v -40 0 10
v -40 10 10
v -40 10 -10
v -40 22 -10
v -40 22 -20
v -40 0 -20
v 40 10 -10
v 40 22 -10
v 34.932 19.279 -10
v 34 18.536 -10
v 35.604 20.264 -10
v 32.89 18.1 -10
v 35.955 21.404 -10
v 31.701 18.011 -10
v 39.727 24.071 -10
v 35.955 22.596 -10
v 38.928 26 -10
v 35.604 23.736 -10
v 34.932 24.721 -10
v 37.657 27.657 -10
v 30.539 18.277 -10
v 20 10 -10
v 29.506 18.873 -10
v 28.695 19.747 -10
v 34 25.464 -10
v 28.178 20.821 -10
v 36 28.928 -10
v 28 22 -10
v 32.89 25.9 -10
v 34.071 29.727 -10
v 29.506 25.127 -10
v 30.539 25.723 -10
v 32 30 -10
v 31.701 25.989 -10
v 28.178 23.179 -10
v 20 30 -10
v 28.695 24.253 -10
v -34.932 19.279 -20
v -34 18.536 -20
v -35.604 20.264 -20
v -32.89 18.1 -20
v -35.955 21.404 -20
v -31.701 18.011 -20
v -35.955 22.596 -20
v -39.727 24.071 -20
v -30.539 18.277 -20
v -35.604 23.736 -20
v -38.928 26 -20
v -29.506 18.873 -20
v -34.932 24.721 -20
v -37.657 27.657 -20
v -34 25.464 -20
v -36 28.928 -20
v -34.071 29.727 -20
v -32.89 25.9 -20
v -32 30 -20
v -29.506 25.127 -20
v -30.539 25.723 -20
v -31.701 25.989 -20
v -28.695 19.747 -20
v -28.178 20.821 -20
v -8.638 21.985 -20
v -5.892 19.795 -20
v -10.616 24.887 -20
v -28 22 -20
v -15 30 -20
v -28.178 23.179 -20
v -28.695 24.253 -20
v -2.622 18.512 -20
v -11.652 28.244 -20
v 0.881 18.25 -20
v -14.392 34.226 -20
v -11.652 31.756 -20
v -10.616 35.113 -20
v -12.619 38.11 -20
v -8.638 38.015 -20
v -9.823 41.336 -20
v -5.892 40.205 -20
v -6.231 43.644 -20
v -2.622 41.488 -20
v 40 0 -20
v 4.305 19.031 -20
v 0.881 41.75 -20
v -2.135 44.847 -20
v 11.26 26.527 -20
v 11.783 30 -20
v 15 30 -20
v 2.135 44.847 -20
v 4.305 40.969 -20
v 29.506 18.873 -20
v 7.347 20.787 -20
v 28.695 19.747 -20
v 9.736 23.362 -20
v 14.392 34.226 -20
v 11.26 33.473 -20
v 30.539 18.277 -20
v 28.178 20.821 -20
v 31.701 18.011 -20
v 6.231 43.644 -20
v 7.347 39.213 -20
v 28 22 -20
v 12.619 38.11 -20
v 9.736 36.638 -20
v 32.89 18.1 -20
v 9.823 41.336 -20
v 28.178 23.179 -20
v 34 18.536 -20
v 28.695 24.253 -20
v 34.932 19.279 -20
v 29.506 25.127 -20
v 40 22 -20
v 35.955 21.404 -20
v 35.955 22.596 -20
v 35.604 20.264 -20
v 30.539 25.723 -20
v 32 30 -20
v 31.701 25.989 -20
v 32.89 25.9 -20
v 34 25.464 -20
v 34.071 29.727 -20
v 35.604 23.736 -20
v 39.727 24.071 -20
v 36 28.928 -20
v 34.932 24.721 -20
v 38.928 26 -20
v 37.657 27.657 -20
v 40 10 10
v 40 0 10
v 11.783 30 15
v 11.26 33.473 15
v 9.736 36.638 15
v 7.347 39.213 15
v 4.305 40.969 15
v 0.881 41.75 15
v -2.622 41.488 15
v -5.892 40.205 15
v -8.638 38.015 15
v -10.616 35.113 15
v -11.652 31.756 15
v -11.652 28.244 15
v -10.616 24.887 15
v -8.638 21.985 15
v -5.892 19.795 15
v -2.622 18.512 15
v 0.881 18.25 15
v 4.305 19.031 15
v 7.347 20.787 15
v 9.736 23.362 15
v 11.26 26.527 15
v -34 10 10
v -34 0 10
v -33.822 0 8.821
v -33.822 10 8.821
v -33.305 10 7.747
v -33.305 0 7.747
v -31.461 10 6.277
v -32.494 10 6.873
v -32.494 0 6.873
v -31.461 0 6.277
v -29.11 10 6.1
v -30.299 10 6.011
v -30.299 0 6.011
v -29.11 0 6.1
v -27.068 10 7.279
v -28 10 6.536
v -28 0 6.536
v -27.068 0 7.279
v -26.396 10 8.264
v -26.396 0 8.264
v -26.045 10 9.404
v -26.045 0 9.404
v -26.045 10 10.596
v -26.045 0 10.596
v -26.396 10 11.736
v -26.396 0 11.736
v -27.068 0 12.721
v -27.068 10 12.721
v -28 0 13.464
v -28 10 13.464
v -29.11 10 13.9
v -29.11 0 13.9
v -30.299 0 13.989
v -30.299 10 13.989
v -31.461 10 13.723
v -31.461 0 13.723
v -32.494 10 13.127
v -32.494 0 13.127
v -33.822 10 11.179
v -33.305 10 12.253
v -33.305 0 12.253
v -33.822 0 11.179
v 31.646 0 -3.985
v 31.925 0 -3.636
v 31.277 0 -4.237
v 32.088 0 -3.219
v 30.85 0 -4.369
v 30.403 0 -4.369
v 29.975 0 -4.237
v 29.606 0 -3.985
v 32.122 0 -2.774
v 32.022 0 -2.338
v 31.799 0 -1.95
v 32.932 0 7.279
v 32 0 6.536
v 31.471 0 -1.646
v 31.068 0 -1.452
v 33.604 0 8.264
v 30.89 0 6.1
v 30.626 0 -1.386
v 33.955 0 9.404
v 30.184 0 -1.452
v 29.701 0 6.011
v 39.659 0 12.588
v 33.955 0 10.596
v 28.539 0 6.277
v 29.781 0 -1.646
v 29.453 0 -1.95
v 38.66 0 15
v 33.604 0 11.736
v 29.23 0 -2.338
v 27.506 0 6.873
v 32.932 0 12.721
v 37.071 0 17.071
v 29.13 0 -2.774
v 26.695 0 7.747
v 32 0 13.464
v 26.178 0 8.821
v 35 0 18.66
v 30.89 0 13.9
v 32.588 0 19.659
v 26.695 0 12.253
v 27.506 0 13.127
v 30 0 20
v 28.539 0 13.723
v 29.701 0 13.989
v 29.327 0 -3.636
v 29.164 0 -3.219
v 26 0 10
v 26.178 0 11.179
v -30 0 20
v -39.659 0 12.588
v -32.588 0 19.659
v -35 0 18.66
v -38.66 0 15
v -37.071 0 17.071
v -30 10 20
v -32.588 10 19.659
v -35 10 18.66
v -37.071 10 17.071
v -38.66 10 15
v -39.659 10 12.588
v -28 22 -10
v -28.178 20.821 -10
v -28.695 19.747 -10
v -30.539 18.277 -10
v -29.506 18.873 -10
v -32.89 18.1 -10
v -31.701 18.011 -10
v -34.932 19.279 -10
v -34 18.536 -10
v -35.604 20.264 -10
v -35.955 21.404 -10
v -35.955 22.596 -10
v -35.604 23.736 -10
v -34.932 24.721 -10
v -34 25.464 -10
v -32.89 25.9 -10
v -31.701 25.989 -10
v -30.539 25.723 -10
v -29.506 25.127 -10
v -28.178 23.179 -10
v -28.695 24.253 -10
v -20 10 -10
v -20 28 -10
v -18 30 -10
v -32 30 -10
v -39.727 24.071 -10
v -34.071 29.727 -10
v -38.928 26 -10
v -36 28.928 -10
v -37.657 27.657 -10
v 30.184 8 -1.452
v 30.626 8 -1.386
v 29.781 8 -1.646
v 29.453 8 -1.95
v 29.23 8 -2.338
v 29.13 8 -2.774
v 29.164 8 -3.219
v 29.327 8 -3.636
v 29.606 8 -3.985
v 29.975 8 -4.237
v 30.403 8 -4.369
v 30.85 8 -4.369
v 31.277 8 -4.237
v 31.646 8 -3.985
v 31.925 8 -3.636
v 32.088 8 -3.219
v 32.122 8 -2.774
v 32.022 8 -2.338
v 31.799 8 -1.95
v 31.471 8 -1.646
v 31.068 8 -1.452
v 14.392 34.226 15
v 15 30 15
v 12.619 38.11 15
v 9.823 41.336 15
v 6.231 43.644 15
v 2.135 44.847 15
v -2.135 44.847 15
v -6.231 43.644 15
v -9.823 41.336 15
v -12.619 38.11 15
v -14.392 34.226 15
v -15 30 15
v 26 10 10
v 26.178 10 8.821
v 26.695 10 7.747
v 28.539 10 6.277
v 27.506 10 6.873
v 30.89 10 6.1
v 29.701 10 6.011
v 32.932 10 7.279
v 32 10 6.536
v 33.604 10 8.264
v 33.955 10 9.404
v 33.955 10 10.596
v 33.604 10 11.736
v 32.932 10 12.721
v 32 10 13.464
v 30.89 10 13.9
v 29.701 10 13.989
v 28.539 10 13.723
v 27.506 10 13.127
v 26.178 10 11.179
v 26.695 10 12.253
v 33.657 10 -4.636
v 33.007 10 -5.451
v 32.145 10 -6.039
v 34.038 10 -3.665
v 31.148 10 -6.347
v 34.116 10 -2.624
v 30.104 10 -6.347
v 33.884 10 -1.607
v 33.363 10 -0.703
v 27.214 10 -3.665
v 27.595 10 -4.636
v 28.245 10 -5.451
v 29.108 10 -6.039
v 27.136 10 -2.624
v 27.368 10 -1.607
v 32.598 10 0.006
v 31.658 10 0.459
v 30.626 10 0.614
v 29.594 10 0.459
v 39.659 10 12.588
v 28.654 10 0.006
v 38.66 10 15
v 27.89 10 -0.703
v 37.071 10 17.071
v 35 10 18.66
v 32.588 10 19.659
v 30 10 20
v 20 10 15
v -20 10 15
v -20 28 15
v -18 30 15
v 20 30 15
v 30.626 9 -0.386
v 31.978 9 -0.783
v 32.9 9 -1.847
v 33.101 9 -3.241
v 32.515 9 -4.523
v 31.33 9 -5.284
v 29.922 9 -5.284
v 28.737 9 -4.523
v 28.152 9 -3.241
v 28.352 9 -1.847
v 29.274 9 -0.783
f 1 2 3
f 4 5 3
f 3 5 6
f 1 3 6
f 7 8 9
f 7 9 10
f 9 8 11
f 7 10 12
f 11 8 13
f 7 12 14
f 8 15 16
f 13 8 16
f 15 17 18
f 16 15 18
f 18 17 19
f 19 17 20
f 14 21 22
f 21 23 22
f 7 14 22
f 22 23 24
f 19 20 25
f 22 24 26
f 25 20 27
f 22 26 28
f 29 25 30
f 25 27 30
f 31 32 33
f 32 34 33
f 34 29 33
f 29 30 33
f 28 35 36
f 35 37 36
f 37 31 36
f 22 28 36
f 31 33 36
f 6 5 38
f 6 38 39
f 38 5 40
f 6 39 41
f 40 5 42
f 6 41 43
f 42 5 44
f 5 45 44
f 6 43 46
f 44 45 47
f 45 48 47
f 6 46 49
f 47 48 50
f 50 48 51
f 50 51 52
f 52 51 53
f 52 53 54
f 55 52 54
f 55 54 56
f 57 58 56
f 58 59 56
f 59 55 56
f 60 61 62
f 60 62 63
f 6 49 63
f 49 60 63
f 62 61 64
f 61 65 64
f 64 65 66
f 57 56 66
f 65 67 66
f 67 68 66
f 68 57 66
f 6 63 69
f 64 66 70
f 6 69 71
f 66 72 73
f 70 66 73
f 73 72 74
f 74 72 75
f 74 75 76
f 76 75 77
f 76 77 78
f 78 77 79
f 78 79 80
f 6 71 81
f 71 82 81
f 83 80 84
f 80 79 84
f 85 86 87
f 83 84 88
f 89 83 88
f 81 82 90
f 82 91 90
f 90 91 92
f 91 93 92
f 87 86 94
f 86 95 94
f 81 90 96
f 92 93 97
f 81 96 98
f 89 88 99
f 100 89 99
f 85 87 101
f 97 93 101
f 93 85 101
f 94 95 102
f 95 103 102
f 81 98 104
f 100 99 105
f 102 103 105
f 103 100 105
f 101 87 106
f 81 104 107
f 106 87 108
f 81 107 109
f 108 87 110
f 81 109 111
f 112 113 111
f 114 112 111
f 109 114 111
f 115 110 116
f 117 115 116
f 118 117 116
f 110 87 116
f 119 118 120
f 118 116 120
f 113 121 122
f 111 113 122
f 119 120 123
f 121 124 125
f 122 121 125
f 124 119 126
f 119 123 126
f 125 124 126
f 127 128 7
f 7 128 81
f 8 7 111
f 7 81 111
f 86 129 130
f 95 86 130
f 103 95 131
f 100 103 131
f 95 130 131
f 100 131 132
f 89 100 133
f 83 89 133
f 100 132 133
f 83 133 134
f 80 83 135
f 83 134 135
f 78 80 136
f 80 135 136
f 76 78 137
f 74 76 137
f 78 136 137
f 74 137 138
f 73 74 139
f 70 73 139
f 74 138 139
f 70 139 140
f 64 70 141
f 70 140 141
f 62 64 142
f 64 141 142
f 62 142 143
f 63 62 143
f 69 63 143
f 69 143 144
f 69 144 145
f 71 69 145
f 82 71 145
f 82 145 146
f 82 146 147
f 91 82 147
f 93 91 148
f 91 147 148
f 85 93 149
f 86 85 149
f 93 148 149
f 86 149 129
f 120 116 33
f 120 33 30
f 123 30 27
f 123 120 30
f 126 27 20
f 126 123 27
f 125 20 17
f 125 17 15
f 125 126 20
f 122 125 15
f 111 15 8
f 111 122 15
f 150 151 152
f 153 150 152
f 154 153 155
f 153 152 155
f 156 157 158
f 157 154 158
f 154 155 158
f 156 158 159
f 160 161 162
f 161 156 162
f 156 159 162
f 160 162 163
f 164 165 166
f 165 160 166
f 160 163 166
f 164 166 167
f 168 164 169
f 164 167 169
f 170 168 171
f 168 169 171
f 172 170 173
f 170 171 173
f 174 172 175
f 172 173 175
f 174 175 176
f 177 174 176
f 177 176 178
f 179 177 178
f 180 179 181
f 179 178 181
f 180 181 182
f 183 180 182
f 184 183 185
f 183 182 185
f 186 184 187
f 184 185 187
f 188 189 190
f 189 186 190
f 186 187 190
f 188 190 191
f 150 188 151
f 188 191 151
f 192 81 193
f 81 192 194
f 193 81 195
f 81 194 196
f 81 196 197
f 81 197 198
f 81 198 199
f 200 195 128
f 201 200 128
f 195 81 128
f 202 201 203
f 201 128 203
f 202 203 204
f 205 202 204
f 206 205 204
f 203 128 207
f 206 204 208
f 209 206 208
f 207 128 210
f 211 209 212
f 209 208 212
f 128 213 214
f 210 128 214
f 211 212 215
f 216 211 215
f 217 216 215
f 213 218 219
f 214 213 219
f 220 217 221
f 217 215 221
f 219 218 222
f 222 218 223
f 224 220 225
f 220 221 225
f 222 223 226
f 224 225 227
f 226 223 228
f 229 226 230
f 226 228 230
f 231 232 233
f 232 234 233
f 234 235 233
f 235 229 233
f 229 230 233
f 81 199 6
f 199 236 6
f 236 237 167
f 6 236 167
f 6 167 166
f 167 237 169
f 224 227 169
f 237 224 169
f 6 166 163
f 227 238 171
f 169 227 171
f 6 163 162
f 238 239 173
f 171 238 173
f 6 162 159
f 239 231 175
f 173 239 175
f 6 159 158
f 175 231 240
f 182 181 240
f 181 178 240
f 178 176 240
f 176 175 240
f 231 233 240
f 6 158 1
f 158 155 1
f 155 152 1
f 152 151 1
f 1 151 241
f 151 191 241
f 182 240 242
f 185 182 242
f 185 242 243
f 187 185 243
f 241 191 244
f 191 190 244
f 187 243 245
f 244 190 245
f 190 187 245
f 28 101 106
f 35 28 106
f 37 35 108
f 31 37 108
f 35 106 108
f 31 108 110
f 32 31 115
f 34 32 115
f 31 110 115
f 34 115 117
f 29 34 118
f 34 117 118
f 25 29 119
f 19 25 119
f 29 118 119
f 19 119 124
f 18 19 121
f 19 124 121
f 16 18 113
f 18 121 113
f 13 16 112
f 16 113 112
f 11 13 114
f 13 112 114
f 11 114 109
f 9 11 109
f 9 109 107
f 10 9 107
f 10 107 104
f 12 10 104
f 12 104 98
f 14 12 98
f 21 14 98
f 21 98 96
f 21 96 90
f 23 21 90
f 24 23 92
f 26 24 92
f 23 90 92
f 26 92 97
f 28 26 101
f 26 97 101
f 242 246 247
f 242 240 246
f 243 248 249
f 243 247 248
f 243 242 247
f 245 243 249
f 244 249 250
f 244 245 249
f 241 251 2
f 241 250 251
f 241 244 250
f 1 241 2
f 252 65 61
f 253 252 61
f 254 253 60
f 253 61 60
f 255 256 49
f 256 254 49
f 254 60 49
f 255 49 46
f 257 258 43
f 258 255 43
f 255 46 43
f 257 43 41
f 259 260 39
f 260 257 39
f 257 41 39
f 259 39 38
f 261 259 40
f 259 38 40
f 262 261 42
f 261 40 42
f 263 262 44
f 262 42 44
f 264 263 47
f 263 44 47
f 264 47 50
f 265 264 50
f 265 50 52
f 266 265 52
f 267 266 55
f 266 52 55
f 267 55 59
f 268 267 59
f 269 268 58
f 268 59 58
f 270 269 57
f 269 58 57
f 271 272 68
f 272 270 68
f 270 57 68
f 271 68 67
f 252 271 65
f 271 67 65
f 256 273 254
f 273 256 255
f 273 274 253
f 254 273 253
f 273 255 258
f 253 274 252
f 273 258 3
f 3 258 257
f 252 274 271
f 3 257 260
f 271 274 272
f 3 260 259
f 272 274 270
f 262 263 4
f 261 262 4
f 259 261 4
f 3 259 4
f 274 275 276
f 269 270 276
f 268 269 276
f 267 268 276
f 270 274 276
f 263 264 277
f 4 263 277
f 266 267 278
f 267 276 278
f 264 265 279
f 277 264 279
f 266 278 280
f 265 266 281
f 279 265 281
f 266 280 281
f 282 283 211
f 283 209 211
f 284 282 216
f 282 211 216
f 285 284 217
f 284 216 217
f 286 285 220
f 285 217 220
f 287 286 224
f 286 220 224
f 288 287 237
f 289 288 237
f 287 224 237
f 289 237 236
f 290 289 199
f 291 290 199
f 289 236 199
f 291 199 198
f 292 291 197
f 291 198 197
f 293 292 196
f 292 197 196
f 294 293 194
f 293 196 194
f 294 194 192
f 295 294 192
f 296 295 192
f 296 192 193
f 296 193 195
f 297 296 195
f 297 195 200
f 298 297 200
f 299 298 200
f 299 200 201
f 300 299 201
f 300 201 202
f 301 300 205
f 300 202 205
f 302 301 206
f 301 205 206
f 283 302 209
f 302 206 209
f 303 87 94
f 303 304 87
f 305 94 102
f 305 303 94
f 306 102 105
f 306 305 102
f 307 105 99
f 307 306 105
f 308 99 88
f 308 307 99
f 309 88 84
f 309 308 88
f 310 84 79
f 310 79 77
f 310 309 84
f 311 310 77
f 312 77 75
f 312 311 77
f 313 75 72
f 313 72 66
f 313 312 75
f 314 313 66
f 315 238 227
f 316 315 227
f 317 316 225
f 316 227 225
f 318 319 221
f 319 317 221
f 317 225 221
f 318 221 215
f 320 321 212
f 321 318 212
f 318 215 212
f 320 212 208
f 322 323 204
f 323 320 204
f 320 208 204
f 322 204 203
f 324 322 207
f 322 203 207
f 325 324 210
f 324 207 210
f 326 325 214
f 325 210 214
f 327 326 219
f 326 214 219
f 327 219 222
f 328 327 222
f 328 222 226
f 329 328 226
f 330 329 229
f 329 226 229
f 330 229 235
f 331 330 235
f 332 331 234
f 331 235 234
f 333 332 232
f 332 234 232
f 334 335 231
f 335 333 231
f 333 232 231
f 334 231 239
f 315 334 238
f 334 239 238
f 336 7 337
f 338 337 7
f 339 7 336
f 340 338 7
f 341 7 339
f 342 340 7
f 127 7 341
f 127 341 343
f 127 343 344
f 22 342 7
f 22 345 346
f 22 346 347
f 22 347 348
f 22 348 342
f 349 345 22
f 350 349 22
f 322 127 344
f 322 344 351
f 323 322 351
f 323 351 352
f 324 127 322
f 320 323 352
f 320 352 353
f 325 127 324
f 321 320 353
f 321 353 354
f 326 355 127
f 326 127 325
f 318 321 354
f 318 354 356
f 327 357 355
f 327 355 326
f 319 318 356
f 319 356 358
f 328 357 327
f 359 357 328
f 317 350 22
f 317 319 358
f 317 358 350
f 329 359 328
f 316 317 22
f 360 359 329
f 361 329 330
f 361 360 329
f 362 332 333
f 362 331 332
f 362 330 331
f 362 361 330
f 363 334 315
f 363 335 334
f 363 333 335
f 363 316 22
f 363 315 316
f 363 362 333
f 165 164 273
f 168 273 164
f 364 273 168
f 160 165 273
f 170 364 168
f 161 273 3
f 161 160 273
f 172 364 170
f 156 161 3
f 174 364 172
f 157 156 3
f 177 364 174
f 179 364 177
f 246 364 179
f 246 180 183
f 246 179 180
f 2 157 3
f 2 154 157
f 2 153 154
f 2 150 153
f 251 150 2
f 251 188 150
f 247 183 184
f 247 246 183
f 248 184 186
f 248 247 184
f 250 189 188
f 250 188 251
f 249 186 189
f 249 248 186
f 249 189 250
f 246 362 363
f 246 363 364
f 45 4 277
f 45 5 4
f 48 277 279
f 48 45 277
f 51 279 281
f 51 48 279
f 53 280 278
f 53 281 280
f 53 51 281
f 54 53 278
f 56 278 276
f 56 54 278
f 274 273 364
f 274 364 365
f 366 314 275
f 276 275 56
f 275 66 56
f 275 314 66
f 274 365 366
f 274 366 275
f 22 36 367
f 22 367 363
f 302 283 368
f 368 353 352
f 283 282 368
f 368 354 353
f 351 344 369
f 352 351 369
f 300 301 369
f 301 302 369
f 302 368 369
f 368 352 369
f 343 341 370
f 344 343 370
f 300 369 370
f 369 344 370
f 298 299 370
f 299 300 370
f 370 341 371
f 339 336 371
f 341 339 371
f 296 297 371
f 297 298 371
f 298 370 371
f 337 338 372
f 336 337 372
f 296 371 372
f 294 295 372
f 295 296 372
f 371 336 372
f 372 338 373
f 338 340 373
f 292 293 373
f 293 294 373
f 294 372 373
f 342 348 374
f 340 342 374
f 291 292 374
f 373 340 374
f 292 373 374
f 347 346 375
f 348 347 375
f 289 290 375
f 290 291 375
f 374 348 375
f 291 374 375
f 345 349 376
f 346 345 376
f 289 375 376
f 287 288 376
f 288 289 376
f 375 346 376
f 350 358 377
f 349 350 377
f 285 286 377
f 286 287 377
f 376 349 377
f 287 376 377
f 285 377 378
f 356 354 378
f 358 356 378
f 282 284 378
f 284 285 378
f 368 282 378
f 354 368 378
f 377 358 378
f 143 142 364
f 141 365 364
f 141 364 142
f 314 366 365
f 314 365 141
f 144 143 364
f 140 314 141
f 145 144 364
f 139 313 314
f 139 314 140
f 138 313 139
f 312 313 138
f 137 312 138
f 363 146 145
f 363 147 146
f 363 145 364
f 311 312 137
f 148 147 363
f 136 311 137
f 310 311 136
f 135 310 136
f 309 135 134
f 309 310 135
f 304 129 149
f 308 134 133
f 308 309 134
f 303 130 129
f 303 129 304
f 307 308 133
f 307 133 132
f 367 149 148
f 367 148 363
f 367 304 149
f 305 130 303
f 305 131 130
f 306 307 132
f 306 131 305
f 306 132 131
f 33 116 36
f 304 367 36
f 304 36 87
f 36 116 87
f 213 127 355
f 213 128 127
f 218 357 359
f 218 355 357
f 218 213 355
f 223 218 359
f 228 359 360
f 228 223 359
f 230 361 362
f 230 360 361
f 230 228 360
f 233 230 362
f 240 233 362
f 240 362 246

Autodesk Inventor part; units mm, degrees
ref_plane "YZ Plane" through (0, 0, 0) normal (1, 0, 0) x (0, 1, 0)
ref_plane "XZ Plane" through (0, 0, 0) normal (0, 1, 0) x (-1, 0, 0)
ref_plane "XY Plane" through (0, 0, 0) normal (0, 0, 1) x (1, 0, 0)
sketch "Sketch1" plane through (0, 0, 0) normal (0, 1, 0) x (-1, 0, 0)
  line L0 (40, 10) -> (40, -20)
  line L1 (40, -20) -> (-40, -20)
  line L2 (-40, -20) -> (-40, 10)
  line L3 (-30, 20) -> (30, 20)
  line L4 (40, 20) -> (-40, -20) construction
  line L5 (40, -20) -> (-40, 20) construction
  arc A0 (40, 10) -> (30, 20) centre (30, 10) ccw
  arc A1 (-30, 20) -> (-40, 10) centre (-30, 10) ccw
  circle A2 centre (30, 10) radius 4
  circle A3 centre (-30, 10) radius 4
  point P0 (0, 0)
  dimension "d0" = 40
  dimension "d1" = 80
  dimension "d2" = 20
  dimension "d3" = 20
  dimension "d4" = 8
  dimension "d5" = 8
extrude "Extrusion1" add sketch "Sketch1" along normal blind 10
sketch "Sketch2" plane through (40, 0, -20) normal (0, 0, -1) x (-1, 0, 0)
  line L0 (70, 10) -> (10, 10) projected
  line L1 (40, 10) -> (60, 10)
  line L2 (40, 10) -> (20, 10)
  line L3 (60, 10) -> (60, 30)
  line L4 (60, 30) -> (20, 30)
  line L5 (20, 30) -> (20, 10)
  point P0 (40, 0)
  dimension "d8" = 20
  dimension "d9" = 20
  dimension "d10" = 20
extrude "Extrusion2" add sketch "Sketch2" against normal blind 35
sketch "Sketch3" plane through (40, 0, 15) normal (0, 0, 1) x (1, 0, 0)
  line L0 (-20, 30) -> (-60, 30) projected
  circle A0 centre (-40, 30) radius 15
  point P0 (-40, 0)
  dimension "d13" = 30
extrude "Extrusion3" cut sketch "Sketch3" against normal blind 35
sketch "Sketch4" plane through (40, 0, -20) normal (0, 0, -1) x (-1, 0, 0)
  line L0 (20, 10) -> (20, 30) projected
  line L1 (20, 30) -> (8.1955, 30)
  circle A0 centre (8, 22) radius 4
  line L2 (0, 10) -> (20, 10) projected
  line L3 (0, 10) -> (20, 10)
  line L4 (20, 10) -> (20, 30)
  line L5 (0, 10) -> (0, 22)
  line L6 (8, 30) -> (8.1955, 30)
  arc A1 (8, 30) -> (0, 22) centre (8, 22) ccw
  point P0 (40, 0)
  dimension "d17" = 8
  dimension "d18" = 16
extrude "Extrusion4" add sketch "Sketch4" against normal blind 10
mirror "Mirror1" about plane through (0, 0, 0) normal (1, 0, 0) of "Extrusion4"
chamfer "Chamfer1" distance 2 angle 45 1 edges at (-20, 30, 2.5)
sketch "Sketch5" plane through (40, 0, 15) normal (0, 0, 1) x (1, 0, 0)
  circle A0 centre (-40, 30) radius 15
  point P0 (-40, 0)
  point P1 (-25, 30)
extrude "Extrusion5" add sketch "Sketch5" against normal up to surface (35 mm away)
sketch "Sketch6" plane through (40, 0, 15) normal (0, 0, 1) x (1, 0, 0)
  arc A0 (-25, 30) -> (-55, 30) centre (-40, 30) ccw projected
  circle A1 centre (-40, 30) radius 11.7834
  point P0 (-40, 0)
extrude "Extrusion6" cut sketch "Sketch6" against normal through all
thread "Thread1" size "M30x3.5" class "6H" standard "ANSI Metric M Profile" full length
hole "Hole1" at (30.6261, 10, -2.8857) direction (0, -1, 0) diameter 3 end through all countersink diameter 7 countersink angle 90
